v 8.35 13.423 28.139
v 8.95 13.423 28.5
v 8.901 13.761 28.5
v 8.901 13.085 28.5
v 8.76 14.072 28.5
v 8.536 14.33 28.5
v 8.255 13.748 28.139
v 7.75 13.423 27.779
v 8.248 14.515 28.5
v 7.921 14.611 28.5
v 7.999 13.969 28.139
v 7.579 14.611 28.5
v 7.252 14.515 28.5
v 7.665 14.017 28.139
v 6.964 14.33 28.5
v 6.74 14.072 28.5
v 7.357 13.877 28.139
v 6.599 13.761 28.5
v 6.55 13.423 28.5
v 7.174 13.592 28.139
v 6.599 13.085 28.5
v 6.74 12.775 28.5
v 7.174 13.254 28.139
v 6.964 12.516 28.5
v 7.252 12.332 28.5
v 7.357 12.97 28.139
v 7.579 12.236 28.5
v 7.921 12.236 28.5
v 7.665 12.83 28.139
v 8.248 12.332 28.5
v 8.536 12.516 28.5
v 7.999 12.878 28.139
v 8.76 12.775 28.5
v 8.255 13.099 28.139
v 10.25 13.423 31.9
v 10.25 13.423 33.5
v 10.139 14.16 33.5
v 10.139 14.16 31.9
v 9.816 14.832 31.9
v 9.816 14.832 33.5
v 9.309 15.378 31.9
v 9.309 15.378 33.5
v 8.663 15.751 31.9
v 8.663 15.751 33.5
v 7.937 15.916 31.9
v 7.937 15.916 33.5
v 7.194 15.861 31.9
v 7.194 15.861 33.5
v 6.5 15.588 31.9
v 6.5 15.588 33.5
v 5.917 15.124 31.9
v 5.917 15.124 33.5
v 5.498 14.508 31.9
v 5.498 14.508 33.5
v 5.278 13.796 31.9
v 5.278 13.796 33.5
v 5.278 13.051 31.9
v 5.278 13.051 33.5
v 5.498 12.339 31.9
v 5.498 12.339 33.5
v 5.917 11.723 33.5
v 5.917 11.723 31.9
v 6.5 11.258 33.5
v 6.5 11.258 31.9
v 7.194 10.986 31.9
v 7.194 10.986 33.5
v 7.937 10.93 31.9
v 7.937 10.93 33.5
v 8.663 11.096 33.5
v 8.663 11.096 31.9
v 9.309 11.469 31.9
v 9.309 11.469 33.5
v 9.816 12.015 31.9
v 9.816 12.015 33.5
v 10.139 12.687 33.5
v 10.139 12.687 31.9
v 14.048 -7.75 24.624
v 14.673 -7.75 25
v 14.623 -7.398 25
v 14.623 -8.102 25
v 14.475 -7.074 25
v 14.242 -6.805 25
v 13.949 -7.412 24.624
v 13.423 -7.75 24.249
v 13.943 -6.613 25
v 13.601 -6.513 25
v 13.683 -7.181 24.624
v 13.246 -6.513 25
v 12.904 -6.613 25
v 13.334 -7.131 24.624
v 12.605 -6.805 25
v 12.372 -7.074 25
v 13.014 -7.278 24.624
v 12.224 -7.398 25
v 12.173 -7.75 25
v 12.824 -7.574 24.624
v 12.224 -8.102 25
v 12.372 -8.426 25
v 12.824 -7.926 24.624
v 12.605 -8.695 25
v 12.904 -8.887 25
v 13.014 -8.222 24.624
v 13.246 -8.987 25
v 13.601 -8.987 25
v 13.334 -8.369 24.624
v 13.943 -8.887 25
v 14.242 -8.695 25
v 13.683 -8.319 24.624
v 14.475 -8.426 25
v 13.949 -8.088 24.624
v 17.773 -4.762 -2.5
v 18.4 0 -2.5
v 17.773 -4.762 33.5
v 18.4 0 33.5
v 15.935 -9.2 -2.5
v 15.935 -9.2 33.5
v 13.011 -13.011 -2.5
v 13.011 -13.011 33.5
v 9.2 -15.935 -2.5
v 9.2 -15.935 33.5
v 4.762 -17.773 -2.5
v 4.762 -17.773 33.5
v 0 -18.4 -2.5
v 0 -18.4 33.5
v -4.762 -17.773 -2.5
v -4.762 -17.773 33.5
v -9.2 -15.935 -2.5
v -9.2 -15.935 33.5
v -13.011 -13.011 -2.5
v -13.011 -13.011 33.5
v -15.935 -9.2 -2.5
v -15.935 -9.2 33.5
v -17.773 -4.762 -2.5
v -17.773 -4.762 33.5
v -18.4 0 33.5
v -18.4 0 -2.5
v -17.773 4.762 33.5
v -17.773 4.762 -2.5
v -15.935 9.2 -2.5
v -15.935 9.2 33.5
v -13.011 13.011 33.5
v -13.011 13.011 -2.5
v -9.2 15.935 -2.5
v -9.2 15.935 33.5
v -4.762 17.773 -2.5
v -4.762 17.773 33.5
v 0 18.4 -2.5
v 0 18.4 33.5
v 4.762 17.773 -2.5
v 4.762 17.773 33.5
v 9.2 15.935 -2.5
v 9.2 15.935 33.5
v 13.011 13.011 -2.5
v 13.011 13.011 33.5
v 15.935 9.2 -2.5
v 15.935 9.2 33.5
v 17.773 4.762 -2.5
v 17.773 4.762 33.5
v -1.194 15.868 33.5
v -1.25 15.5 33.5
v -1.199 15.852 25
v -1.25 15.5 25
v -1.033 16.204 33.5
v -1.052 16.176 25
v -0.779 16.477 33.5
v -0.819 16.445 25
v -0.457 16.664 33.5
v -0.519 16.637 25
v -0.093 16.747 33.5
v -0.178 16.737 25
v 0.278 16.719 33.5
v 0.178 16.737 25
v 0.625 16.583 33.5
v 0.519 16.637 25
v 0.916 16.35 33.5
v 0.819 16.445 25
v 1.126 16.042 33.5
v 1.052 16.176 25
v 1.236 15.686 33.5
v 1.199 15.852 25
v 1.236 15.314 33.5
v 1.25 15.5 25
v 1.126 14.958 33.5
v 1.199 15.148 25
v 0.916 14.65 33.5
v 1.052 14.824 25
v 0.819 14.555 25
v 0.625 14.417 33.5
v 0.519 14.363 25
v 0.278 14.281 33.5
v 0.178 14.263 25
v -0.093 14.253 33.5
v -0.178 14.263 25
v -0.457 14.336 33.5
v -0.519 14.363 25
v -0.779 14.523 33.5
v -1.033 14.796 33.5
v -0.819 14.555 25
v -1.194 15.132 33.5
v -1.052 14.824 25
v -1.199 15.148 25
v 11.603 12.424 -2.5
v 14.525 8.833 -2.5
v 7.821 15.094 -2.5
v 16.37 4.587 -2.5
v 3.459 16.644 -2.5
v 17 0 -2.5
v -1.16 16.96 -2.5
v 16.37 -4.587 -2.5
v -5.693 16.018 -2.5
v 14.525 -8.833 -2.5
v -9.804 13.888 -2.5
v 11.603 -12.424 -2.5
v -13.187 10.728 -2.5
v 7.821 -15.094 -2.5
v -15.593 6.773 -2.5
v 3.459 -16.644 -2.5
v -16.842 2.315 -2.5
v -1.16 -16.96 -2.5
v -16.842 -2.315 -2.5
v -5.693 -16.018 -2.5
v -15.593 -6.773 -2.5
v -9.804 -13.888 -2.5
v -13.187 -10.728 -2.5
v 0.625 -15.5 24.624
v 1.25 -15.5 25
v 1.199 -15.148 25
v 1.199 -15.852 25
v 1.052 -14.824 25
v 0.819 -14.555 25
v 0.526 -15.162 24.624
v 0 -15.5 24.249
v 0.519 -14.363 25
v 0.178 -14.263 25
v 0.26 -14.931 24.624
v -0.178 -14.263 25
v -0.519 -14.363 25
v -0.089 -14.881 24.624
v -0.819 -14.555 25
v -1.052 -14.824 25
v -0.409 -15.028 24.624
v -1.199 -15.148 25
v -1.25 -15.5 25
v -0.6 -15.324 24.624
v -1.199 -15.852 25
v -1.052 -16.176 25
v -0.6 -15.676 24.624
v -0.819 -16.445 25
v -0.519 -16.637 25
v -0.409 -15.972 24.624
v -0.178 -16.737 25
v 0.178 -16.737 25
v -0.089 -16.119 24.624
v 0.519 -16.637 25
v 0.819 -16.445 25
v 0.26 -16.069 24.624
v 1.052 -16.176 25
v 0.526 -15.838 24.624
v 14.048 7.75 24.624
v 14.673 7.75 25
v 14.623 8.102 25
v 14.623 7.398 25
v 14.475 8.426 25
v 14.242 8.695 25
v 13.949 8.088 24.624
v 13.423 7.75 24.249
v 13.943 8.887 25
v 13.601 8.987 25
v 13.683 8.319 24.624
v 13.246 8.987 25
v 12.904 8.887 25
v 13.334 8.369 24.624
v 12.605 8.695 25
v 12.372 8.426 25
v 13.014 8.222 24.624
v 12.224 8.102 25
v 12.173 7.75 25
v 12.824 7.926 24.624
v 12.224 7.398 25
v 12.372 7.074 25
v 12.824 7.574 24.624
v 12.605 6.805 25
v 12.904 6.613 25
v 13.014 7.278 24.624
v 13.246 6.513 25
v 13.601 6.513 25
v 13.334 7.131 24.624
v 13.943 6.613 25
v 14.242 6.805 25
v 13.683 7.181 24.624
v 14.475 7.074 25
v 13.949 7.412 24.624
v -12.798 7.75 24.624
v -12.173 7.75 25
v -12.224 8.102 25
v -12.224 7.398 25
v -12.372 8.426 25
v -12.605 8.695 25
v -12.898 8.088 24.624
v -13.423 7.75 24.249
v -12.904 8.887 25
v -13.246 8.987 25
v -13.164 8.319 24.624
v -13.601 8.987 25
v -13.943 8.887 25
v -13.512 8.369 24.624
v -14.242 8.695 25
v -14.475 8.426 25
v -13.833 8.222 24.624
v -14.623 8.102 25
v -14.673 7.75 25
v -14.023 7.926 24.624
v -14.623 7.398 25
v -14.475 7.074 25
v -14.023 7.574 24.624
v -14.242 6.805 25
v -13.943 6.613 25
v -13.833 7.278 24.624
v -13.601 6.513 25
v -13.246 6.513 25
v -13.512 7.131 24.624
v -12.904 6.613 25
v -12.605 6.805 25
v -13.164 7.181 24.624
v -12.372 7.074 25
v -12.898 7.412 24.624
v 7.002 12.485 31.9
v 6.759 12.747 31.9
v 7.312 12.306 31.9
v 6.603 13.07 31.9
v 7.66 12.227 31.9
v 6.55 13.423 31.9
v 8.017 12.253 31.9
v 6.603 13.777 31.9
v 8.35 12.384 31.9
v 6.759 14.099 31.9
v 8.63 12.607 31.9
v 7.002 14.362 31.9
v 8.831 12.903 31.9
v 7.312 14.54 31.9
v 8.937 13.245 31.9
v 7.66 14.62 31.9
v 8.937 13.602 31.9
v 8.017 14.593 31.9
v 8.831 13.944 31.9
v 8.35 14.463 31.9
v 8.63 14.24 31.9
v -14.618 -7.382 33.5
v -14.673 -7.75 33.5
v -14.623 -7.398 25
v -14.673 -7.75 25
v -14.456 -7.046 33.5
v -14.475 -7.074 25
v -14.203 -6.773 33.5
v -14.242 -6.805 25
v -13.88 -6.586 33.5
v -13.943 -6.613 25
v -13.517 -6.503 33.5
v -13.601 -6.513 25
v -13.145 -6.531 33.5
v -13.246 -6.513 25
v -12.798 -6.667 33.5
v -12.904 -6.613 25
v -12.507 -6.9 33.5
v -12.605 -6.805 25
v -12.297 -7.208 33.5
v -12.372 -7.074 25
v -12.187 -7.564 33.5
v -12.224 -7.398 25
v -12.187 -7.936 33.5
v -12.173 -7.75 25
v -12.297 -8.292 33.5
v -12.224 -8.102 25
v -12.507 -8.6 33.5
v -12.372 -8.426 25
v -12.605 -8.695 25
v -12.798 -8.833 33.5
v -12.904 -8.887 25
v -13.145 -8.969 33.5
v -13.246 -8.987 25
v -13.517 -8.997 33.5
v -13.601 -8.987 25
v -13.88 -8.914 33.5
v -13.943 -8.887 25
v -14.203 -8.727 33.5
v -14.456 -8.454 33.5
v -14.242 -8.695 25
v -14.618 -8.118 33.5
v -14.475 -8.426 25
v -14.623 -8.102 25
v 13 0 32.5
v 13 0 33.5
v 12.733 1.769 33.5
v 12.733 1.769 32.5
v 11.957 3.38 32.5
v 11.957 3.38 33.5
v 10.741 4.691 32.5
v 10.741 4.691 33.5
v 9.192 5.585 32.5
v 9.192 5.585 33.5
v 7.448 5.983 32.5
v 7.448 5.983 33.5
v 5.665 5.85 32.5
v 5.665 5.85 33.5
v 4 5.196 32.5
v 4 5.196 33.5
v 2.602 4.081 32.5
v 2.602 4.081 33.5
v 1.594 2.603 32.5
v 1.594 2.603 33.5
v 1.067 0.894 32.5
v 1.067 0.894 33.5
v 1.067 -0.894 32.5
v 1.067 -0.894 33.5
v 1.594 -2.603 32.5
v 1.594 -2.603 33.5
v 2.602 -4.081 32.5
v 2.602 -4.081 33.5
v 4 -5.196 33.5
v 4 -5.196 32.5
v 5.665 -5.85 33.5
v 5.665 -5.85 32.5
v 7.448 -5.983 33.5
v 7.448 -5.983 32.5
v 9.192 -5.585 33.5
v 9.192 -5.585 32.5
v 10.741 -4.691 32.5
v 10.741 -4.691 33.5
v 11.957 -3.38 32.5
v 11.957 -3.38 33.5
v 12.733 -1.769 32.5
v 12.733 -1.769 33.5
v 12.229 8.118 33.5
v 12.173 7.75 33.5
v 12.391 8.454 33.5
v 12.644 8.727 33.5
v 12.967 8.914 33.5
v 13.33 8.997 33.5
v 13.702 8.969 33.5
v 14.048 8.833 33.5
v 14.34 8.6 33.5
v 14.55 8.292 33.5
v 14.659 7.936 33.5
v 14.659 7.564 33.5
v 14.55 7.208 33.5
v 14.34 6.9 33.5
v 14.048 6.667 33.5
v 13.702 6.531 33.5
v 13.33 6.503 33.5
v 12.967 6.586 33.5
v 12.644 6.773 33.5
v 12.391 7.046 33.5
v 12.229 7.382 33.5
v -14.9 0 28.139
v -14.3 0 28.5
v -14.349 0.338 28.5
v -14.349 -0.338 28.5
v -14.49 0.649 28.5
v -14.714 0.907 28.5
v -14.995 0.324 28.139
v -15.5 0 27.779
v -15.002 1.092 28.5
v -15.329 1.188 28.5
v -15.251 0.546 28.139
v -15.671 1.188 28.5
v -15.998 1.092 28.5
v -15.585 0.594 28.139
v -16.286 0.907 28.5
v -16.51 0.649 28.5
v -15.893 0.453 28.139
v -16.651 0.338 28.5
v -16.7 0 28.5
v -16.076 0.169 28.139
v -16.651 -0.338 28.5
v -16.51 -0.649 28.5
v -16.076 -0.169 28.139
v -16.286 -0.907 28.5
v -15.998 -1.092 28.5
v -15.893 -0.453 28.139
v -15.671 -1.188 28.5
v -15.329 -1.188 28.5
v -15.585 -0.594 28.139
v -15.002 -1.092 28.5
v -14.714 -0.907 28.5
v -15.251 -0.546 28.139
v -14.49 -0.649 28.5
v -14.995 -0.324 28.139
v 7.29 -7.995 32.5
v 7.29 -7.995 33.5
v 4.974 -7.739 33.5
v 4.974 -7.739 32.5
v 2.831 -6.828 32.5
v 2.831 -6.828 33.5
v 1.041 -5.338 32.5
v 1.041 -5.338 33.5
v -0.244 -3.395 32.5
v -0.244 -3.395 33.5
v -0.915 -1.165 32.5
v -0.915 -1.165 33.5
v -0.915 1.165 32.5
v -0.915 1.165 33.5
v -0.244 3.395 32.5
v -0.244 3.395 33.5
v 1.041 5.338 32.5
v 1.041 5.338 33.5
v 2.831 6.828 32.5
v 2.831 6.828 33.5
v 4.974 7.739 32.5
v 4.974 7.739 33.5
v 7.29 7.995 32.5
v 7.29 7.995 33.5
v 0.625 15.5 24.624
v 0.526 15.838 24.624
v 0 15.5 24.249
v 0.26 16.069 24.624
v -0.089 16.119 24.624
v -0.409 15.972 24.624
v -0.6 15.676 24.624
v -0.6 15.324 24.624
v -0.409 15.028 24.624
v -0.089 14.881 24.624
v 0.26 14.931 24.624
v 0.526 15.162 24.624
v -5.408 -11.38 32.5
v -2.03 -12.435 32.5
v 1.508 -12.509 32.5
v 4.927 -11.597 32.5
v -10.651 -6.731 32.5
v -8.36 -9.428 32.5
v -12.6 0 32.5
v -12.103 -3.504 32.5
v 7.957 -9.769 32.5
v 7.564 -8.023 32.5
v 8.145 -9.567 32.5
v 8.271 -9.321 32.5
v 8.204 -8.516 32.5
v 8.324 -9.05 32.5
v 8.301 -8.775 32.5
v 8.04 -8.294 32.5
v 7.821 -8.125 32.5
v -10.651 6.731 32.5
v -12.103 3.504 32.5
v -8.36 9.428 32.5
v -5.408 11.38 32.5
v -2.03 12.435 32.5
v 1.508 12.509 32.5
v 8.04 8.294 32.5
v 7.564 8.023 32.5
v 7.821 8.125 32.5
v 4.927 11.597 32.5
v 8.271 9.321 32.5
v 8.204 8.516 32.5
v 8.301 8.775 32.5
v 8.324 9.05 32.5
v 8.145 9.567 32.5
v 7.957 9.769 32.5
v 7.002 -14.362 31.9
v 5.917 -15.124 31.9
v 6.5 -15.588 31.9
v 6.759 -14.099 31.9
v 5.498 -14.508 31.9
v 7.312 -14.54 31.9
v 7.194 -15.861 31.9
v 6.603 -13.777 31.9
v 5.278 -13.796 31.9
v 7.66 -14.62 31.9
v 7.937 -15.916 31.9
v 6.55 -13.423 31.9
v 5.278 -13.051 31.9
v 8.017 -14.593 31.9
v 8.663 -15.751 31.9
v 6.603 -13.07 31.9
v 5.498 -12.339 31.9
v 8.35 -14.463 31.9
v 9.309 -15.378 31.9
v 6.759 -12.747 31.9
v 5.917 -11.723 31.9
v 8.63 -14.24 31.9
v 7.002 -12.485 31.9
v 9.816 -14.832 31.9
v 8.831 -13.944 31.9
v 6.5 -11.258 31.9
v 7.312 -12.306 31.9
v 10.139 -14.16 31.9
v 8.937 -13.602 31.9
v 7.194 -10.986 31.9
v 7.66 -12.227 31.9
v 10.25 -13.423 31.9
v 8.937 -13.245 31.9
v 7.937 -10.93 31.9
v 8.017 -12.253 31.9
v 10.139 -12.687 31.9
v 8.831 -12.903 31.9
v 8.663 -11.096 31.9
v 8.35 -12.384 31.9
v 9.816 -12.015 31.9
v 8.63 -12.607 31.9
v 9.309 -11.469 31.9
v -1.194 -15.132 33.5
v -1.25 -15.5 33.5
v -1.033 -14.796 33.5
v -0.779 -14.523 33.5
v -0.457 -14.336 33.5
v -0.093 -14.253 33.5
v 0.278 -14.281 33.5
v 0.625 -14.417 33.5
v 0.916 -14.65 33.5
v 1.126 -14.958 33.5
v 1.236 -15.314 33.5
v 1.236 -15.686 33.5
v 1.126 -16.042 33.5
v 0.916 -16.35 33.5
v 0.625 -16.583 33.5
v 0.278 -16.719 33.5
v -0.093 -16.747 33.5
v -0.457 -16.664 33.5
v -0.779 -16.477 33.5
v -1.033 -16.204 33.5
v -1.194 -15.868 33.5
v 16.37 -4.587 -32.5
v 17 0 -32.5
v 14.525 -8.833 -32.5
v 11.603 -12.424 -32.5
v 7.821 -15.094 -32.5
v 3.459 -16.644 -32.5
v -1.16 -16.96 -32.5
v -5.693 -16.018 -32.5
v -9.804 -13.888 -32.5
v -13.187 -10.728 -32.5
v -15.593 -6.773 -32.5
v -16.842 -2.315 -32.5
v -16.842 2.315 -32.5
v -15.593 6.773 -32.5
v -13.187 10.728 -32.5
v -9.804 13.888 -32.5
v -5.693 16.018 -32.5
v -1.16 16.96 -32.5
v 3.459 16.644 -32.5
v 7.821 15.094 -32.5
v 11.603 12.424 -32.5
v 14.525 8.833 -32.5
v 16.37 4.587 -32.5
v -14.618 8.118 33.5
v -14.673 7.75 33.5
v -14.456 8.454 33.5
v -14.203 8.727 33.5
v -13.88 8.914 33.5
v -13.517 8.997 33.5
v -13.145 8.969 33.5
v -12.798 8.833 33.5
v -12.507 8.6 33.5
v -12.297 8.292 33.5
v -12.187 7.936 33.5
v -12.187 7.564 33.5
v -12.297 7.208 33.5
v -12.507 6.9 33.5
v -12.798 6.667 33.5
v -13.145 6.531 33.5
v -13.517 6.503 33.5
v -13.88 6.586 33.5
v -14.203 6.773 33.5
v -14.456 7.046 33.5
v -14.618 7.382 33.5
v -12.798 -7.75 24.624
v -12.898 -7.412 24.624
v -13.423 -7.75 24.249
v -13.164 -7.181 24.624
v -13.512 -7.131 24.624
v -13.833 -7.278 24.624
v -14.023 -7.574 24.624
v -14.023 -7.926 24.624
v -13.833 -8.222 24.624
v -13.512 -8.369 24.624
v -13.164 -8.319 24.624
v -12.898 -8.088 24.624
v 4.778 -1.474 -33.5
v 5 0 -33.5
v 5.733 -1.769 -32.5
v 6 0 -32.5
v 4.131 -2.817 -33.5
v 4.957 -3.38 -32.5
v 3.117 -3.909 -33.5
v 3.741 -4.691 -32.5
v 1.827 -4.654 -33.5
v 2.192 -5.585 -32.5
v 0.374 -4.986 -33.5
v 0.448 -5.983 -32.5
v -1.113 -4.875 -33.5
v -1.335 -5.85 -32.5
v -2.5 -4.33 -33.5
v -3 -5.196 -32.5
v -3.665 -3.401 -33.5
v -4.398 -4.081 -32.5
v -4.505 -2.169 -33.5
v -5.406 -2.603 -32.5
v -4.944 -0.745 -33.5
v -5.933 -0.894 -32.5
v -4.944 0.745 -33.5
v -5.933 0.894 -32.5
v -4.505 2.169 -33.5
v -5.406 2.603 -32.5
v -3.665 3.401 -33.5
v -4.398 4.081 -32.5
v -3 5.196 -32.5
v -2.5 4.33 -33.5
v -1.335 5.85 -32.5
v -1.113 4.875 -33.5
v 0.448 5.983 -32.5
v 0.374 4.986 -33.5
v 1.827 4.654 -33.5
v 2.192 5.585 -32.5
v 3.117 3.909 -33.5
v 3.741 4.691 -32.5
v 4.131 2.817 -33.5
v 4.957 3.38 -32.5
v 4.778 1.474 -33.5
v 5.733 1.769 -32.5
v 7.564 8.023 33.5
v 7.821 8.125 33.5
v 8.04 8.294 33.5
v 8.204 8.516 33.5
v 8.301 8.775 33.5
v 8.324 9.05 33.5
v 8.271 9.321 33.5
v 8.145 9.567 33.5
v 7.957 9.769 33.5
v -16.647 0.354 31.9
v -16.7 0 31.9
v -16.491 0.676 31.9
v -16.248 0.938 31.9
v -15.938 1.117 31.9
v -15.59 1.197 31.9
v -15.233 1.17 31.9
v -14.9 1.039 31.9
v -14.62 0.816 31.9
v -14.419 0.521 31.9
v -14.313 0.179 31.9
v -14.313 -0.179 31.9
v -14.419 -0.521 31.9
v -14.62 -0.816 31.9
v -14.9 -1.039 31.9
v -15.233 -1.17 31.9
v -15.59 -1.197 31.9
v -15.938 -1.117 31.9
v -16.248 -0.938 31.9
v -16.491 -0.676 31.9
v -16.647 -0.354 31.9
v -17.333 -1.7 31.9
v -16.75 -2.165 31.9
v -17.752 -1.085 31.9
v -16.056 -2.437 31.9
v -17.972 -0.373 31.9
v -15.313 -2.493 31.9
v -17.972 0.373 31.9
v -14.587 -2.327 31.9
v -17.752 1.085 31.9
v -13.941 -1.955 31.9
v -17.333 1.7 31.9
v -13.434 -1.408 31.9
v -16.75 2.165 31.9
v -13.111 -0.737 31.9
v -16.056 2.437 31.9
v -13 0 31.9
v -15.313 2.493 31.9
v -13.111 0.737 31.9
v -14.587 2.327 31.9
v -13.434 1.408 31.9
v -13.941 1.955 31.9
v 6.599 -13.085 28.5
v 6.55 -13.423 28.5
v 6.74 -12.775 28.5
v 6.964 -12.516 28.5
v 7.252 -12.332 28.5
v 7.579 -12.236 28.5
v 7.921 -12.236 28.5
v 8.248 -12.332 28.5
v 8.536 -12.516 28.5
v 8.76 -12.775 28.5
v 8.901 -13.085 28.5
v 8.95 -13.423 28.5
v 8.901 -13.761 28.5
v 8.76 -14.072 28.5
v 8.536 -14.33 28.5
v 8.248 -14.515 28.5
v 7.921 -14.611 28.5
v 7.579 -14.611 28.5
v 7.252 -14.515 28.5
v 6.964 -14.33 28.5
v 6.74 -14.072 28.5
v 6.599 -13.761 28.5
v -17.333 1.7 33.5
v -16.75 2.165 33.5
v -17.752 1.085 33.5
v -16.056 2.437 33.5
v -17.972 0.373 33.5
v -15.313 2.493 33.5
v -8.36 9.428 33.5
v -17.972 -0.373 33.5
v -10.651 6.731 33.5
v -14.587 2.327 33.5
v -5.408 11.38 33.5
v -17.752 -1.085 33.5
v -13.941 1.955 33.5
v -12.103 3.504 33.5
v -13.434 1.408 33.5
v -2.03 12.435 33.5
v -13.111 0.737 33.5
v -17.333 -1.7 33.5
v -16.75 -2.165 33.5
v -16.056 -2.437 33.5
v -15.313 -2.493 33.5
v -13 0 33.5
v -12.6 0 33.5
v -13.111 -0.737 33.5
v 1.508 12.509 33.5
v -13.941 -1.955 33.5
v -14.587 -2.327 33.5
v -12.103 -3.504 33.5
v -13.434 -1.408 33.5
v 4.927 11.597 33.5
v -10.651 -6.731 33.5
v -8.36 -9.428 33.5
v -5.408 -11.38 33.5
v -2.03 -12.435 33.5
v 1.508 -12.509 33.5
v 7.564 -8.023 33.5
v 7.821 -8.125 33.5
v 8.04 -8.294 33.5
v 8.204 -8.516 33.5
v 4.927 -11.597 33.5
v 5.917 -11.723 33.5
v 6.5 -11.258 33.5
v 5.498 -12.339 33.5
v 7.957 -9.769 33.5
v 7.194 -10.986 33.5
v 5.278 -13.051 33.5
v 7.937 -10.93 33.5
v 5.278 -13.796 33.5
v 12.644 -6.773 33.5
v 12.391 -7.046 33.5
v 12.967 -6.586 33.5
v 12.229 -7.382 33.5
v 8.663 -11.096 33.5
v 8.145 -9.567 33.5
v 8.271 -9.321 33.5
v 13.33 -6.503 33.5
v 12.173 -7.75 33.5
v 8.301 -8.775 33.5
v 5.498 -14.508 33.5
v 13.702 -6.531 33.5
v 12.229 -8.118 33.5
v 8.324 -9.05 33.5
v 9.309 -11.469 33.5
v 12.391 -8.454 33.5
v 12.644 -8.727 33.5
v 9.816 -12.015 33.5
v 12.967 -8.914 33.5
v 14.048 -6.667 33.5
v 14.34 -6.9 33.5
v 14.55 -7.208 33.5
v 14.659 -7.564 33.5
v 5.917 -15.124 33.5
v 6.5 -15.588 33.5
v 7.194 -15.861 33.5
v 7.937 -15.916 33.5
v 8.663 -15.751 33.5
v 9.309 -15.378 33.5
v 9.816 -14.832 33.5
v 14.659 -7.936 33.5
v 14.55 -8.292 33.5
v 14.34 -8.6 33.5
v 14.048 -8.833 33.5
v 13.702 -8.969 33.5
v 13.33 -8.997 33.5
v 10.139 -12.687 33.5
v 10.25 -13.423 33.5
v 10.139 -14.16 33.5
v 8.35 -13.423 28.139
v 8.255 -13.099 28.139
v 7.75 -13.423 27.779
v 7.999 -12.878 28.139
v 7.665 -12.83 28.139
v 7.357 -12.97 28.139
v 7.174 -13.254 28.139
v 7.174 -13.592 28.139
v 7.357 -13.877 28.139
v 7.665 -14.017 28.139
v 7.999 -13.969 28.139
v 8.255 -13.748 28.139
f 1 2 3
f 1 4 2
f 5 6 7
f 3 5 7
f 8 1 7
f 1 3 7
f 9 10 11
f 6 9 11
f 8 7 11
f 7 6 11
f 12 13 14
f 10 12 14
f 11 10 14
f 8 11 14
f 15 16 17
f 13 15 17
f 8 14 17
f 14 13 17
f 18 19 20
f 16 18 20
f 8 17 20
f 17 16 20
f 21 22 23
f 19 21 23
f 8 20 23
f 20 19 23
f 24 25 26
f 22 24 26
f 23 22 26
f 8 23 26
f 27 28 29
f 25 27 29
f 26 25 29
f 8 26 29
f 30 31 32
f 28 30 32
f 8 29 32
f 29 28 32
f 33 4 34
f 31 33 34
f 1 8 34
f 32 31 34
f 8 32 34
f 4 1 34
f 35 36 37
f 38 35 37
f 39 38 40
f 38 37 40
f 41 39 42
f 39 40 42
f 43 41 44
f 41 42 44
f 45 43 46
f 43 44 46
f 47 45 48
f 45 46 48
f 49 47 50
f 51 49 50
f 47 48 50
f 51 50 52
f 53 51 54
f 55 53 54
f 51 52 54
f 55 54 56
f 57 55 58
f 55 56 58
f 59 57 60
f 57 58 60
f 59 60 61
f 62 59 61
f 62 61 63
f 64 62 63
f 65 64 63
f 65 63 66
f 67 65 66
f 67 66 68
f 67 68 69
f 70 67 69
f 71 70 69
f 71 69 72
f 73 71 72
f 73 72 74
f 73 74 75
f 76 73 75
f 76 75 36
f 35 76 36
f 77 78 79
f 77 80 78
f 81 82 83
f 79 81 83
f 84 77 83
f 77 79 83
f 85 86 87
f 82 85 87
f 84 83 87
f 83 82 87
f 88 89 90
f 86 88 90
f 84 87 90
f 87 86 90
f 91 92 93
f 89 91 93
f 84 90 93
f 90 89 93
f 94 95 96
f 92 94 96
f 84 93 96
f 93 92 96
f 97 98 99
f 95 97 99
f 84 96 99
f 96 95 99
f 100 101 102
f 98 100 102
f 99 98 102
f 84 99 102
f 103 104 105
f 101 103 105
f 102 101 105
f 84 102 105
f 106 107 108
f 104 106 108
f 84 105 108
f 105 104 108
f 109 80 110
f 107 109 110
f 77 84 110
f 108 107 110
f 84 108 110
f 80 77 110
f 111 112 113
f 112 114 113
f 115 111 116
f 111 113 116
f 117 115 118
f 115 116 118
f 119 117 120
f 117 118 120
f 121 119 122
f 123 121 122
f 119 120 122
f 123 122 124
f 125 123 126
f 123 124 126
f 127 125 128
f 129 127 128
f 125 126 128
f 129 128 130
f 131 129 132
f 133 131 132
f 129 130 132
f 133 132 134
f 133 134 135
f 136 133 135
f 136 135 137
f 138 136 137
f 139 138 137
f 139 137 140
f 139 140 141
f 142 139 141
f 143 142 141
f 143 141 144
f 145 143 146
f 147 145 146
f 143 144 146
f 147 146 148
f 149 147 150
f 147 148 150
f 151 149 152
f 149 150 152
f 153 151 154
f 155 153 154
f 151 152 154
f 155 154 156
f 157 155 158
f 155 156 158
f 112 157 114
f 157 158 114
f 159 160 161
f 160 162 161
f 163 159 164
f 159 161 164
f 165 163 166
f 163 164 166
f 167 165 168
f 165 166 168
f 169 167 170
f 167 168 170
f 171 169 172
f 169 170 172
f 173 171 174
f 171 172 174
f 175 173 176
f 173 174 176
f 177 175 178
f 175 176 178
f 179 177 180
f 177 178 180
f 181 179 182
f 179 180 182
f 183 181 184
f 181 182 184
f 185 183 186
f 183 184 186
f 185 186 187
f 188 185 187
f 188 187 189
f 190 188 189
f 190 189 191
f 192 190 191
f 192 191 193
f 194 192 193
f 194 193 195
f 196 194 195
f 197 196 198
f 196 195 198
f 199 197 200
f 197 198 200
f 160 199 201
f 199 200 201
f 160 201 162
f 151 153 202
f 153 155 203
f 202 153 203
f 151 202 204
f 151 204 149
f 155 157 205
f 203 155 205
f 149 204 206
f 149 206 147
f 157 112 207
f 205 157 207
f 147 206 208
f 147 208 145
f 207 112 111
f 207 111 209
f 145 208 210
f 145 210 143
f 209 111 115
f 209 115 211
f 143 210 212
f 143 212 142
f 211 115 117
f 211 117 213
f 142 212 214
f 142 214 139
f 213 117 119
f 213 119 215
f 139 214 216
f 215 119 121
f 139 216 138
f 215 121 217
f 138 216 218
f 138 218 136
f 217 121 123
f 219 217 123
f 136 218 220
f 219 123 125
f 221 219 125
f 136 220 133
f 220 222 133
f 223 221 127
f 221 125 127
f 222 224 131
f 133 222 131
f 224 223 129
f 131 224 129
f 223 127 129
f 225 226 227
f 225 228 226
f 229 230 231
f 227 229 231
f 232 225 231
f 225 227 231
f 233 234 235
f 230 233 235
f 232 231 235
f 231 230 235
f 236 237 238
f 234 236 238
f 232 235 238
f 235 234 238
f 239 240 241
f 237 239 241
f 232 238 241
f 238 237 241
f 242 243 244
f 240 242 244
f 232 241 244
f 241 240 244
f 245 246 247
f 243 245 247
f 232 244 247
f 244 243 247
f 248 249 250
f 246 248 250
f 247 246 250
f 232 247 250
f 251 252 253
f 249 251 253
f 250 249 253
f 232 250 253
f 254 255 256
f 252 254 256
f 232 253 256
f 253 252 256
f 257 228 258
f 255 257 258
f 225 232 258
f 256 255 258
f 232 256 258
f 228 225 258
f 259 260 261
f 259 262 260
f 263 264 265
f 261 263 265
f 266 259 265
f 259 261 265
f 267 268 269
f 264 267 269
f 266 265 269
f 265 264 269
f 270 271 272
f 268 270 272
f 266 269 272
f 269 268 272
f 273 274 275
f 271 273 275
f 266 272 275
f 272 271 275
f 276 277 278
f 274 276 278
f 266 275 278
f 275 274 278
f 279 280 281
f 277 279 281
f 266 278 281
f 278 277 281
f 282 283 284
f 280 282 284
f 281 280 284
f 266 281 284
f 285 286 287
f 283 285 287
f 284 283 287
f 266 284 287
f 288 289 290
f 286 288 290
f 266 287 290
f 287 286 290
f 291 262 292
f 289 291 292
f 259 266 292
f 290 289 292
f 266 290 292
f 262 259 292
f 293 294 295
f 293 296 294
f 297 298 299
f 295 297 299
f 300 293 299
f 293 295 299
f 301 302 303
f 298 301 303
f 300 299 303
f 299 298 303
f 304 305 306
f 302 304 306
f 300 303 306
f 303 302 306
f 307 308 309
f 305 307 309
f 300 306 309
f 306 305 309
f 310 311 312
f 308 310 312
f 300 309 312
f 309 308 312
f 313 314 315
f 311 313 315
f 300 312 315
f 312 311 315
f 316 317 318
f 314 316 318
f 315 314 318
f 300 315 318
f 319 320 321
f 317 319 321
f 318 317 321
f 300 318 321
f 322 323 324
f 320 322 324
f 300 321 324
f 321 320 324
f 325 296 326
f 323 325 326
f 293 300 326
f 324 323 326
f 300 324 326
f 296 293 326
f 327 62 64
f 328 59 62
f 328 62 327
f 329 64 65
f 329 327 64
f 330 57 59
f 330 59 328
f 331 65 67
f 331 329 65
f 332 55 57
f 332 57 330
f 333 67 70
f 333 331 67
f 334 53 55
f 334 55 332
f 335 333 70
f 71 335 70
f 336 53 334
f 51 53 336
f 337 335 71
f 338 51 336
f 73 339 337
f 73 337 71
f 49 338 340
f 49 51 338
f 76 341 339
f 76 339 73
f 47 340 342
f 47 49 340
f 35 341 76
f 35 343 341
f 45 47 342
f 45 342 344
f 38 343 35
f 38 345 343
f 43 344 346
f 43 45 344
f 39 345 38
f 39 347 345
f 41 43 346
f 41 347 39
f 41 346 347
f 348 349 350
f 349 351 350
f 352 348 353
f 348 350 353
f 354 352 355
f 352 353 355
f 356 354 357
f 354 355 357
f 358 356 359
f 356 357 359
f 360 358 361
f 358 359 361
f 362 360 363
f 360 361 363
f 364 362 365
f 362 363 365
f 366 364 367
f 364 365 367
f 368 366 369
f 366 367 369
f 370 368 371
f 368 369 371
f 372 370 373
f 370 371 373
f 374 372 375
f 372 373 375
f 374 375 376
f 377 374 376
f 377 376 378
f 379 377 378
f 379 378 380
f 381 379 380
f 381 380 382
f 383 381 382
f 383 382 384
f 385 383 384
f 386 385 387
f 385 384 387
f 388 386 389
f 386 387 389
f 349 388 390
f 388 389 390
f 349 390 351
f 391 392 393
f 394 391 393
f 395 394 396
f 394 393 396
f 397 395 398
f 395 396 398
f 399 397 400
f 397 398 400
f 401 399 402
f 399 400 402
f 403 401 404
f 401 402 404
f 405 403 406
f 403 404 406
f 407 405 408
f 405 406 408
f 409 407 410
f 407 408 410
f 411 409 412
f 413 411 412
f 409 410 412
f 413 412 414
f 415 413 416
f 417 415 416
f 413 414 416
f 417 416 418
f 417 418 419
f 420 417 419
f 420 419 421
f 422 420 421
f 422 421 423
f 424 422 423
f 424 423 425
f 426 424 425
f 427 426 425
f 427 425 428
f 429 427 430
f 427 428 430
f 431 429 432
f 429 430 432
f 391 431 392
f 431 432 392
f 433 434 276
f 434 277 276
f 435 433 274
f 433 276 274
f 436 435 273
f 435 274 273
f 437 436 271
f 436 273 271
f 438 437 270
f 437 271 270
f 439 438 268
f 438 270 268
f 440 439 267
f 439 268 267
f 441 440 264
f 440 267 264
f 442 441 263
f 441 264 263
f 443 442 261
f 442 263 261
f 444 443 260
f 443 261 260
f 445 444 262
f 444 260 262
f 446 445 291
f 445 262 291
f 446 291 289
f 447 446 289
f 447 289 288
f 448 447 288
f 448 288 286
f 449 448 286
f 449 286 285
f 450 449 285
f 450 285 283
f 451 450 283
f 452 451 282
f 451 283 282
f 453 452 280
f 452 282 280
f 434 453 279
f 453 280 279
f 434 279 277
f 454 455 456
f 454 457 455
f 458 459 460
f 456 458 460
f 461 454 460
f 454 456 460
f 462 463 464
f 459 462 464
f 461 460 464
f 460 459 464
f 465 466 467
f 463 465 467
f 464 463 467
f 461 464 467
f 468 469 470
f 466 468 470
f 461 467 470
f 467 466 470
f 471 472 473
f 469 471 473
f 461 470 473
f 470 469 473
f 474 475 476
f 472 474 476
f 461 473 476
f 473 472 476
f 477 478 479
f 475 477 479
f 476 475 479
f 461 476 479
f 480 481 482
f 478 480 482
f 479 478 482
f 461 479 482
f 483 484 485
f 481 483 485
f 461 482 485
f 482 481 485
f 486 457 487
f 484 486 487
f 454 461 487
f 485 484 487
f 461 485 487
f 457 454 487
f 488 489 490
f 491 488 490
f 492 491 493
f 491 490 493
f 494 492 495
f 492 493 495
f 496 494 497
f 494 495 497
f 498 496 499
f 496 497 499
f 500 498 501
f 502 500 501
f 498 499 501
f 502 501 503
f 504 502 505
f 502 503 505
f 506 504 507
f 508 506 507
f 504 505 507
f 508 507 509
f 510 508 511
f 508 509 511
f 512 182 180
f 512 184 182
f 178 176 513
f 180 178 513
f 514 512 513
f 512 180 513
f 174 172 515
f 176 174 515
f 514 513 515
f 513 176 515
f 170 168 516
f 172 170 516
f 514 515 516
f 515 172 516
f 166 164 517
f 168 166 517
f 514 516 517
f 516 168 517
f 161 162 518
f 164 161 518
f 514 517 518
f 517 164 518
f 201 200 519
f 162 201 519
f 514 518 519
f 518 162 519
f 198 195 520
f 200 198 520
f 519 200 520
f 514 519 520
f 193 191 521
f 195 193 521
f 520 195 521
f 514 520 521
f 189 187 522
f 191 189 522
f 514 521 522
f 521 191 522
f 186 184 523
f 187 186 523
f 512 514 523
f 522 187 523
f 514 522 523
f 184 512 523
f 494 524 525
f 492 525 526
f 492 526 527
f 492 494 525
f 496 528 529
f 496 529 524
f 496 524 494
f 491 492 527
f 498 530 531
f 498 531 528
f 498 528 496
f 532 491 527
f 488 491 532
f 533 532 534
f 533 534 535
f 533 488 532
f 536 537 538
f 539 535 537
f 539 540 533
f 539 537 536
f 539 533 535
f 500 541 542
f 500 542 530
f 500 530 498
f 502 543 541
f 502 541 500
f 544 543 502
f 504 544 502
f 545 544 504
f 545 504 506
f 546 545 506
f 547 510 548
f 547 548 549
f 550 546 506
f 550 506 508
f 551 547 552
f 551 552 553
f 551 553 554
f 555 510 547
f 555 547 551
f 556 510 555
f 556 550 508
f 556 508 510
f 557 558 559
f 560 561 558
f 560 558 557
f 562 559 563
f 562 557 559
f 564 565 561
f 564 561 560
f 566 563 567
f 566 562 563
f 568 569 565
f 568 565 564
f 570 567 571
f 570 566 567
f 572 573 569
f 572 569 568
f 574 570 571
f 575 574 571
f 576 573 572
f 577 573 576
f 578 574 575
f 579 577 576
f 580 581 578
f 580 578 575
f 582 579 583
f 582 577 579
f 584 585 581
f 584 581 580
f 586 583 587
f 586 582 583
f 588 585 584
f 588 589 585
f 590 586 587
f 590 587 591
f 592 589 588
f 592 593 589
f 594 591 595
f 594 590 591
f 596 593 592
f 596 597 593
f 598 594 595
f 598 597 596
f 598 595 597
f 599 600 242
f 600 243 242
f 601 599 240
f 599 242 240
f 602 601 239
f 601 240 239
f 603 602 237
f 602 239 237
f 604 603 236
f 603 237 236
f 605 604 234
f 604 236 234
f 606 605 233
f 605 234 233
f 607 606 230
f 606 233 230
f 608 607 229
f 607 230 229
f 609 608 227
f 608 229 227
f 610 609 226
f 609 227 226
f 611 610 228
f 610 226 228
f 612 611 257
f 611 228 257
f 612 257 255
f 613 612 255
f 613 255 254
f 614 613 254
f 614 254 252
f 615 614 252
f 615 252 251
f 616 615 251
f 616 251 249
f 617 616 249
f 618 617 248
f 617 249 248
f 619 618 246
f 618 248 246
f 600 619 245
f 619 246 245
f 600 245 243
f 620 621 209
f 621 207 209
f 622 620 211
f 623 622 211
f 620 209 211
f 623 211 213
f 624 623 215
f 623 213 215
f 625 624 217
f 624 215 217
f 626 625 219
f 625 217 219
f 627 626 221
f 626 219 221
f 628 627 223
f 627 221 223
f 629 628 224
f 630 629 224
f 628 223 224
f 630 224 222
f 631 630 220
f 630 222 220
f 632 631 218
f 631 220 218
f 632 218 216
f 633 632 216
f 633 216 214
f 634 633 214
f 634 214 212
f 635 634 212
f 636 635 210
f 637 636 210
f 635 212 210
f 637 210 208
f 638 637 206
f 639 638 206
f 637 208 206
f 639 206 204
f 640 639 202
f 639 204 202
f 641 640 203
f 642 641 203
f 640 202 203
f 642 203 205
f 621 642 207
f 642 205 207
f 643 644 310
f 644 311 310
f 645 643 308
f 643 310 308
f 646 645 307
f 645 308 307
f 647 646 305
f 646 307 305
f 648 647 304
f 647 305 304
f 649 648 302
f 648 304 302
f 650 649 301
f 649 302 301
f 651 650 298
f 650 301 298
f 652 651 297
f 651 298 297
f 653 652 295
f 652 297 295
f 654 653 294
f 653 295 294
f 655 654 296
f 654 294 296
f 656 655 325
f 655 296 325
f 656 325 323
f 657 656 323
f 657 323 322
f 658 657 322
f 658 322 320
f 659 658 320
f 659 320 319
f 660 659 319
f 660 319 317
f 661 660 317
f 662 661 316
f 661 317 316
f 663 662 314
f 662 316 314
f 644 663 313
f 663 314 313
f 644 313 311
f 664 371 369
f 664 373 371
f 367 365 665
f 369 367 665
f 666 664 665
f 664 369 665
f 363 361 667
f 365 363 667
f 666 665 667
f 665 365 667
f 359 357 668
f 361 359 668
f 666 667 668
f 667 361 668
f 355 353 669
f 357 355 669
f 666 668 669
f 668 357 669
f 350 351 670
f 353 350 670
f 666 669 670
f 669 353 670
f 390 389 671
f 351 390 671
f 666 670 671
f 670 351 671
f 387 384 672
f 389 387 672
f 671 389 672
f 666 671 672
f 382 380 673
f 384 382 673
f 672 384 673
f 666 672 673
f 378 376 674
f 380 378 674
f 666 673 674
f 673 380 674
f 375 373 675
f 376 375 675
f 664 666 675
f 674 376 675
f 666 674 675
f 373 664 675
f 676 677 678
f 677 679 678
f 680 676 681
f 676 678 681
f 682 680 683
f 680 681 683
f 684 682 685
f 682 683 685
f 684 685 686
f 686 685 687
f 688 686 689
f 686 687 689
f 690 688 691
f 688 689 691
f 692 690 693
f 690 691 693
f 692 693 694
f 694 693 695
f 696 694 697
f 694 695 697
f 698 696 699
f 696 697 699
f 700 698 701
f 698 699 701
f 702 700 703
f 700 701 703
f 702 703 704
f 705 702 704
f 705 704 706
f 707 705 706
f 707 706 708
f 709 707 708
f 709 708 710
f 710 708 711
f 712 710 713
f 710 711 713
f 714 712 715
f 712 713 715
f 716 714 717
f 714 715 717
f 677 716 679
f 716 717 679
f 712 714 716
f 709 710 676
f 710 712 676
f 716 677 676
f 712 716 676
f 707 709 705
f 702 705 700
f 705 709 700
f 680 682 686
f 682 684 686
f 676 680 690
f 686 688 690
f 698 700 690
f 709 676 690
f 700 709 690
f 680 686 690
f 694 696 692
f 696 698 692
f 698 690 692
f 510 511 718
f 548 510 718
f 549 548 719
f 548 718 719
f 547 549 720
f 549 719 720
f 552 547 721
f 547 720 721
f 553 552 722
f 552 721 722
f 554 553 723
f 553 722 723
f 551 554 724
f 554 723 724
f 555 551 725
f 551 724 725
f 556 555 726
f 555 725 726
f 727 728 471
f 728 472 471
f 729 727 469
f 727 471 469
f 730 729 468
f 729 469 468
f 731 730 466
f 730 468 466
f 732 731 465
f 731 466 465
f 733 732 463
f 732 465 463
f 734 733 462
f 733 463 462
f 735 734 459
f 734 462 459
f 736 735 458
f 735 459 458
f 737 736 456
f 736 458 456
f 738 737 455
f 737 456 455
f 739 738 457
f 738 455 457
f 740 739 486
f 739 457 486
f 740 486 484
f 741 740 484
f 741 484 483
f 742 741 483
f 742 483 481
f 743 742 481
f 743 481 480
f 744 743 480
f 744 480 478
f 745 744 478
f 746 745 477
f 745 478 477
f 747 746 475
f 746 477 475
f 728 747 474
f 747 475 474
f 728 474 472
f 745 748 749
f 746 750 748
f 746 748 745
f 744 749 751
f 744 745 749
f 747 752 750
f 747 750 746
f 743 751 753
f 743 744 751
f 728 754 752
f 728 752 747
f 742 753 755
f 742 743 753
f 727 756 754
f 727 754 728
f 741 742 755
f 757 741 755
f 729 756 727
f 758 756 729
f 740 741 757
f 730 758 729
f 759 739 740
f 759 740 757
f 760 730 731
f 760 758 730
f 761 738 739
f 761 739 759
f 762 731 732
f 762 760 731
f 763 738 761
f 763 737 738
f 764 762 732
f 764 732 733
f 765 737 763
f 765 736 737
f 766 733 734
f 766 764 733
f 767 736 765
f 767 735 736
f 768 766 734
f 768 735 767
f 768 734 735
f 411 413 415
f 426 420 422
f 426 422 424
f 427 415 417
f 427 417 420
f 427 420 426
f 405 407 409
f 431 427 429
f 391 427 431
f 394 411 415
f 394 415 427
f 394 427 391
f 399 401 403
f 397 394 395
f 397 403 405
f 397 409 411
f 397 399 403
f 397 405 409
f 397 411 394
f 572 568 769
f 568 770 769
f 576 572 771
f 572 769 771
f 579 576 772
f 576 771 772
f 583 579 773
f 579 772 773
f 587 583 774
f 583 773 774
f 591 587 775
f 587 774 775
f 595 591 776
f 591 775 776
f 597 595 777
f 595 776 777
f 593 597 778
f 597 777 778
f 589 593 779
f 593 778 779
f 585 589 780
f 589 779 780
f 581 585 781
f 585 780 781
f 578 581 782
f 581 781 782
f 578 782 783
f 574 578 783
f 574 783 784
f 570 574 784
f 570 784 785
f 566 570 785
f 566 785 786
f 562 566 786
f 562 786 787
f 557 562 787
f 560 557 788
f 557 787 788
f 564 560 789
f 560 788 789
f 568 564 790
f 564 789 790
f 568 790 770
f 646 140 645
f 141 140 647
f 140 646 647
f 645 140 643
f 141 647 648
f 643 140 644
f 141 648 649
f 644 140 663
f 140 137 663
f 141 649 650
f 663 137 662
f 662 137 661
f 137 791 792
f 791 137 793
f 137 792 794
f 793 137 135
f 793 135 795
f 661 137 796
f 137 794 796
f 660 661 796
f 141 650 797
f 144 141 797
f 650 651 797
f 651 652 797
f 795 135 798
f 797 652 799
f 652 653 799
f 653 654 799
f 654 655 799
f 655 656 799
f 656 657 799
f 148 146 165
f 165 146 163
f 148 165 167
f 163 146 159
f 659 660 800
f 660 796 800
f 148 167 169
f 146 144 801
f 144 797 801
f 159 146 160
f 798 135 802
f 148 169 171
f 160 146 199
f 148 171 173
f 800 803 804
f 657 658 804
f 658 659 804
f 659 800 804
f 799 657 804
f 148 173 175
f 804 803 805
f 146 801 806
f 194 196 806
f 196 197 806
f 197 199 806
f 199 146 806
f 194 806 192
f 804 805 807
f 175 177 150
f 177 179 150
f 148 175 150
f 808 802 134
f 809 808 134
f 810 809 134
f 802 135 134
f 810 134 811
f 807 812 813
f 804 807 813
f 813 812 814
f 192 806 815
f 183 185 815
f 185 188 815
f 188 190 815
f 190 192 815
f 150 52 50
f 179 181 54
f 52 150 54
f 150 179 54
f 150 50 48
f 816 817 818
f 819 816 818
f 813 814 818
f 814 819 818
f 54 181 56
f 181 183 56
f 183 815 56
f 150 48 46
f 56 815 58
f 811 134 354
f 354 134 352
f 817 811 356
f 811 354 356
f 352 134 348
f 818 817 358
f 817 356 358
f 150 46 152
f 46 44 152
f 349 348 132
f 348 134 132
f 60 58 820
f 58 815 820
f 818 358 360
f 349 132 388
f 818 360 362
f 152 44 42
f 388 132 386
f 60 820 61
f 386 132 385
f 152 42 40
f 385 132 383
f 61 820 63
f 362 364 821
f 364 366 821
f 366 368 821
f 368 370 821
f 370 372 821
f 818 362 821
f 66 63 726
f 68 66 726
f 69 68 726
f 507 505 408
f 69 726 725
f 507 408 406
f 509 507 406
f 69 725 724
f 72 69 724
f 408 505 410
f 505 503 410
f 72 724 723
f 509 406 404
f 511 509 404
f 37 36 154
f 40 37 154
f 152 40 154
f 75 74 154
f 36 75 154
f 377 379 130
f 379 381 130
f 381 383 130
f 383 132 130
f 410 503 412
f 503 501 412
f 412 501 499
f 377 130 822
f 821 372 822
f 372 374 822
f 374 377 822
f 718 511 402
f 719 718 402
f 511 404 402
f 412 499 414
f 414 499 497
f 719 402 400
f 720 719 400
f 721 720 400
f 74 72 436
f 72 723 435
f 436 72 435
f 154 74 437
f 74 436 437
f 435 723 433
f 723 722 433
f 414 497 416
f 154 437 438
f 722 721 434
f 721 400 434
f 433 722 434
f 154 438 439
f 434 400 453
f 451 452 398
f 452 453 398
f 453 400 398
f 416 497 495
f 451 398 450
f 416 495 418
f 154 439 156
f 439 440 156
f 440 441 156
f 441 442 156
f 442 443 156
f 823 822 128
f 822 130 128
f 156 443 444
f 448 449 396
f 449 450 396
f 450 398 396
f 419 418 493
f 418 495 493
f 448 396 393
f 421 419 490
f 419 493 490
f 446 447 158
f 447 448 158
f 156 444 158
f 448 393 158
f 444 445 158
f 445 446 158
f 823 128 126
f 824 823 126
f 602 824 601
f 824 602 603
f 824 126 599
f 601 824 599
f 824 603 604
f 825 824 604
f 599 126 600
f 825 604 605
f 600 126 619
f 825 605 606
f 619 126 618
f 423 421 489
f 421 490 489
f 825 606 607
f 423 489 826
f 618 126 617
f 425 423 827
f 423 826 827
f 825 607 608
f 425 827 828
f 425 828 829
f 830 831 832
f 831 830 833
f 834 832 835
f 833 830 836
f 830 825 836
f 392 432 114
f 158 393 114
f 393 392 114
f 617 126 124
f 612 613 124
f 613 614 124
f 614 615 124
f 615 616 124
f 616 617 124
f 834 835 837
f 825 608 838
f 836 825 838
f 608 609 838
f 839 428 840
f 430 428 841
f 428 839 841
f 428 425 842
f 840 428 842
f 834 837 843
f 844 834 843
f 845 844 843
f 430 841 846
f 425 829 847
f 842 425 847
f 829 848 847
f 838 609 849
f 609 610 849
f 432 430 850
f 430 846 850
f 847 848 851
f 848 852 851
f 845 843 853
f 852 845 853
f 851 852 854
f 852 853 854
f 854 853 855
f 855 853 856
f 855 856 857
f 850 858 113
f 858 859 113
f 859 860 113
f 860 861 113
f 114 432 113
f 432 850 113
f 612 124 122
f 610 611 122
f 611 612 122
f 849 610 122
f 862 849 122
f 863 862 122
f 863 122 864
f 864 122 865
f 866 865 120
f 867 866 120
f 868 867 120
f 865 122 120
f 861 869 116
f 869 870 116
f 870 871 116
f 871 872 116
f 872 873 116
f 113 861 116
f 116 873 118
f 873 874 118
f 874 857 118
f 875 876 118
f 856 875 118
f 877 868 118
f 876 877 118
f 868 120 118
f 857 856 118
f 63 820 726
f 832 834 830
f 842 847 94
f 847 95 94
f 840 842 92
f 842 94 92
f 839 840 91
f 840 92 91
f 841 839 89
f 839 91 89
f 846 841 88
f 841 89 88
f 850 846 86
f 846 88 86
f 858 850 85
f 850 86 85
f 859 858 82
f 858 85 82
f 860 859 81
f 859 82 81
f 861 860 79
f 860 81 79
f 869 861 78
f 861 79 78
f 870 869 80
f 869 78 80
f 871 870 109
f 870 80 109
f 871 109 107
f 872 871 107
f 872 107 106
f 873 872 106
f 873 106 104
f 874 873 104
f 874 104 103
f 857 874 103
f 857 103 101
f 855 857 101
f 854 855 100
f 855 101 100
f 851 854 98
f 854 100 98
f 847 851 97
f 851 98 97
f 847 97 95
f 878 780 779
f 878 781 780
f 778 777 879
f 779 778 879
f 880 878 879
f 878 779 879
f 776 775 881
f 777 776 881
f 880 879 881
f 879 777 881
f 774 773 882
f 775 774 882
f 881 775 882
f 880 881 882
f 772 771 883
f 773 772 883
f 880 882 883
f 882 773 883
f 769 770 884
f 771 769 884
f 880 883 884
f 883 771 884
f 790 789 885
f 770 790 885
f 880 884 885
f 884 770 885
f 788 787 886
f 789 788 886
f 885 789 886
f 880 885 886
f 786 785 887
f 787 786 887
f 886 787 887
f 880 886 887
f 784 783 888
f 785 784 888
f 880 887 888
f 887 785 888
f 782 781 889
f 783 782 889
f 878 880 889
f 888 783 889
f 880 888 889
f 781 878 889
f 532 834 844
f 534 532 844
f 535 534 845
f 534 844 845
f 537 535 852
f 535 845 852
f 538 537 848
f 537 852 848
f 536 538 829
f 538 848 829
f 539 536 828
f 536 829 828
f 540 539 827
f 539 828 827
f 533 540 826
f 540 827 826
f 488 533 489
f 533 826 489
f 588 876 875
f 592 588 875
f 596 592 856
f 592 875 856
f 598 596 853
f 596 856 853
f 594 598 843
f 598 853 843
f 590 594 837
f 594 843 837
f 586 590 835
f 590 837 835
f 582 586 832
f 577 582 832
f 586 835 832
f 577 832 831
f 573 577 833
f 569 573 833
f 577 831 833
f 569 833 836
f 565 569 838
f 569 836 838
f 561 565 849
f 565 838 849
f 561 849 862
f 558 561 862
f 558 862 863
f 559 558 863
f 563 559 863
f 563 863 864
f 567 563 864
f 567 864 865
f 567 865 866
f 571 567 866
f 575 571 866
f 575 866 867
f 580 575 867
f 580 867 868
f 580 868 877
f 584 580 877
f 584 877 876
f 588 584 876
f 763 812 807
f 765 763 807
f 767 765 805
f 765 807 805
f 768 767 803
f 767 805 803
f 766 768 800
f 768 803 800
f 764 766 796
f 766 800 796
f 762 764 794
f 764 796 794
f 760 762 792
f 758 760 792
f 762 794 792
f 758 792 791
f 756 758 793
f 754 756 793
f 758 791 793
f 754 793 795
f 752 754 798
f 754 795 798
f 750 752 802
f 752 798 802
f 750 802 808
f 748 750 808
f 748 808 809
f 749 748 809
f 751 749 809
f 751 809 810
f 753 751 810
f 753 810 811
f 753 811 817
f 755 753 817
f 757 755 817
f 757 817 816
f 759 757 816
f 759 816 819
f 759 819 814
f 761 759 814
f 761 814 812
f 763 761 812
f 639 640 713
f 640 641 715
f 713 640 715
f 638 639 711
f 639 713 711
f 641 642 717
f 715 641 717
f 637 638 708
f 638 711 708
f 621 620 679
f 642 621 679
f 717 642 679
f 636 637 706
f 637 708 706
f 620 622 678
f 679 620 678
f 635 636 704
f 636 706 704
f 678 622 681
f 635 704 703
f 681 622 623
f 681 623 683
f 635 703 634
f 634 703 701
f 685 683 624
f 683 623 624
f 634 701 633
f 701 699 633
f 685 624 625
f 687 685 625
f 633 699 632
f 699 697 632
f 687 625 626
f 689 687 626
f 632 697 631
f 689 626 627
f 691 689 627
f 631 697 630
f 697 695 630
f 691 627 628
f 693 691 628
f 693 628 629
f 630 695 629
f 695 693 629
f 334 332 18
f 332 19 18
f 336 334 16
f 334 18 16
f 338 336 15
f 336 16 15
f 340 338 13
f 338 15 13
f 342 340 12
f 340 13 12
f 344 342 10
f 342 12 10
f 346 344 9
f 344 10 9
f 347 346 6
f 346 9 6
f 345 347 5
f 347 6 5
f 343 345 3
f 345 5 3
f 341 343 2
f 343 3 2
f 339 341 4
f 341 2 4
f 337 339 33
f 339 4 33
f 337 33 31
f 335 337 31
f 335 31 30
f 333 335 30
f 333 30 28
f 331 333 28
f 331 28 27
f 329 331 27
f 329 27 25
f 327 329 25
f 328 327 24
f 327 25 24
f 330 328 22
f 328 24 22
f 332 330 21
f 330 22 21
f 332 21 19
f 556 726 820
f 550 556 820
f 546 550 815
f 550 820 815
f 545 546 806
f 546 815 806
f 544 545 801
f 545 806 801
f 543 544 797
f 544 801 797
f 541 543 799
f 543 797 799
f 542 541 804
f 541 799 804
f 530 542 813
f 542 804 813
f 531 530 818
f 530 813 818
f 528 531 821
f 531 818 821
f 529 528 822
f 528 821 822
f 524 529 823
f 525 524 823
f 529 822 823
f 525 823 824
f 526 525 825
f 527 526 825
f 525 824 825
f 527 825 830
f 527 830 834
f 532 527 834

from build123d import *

# Parameters (mm, degrees)
TALADRO_ROSCADO_M3X0_52_D                            = 2.5
TALADRO_ROSCADO_M3X0_52_DEPTH                        = 8.5
TALADRO_ROSCADO_M3X0_52_TIP                          = 0.751075774
REFRENTADO_PARA_TORNILLO_CON_CABEZA_TRON_D           = 2.4
REFRENTADO_PARA_TORNILLO_CON_CABEZA_TRON_DEPTH       = 5
REFRENTADO_PARA_TORNILLO_CON_CABEZA_TRON_CBORE_D     = 5
REFRENTADO_PARA_TORNILLO_CON_CABEZA_TRON_CBORE_DEPTH = 1.6
REFRENTADO_PARA_TORNILLO_CON_CABEZA_TRON_TIP         = 0.721032743
CROQUIS8_R                                           = 6
CORTAR_EXTRUIR2_DEPTH                                = 1


with BuildPart() as part:
    # Croquis1 → Revolución1 (revolve)
    with BuildSketch(Plane(origin=(0, 0, 0), x_dir=(0, 0, -1), z_dir=(1, 0, 0)), mode=Mode.PRIVATE) as revoluci_n1_sk:
        Polygon((-33.5, 0), (33.5, 0), (33.5, 5), (32.5, 6), (32.5, 17), (2.5, 17), (2.5, 18.4), (-33.5, 18.4), align=None)
    revolve(revoluci_n1_sk.sketch.rotate(Axis((0, 0, 33.5), (0, 0, -1)), 90), axis=Axis((0, 0, 33.5), (0, 0, -1)))

    # Taladro roscado M3x0.52
    with Locations(Plane.XY.offset(33.5)):
        with Locations((0, 15.5), (0, -15.5), (13.423393759, -7.75), (13.423393759, 7.75), (-13.423393759, 7.75), (-13.423393759, -7.75)):
            Hole(TALADRO_ROSCADO_M3X0_52_D / 2, depth=TALADRO_ROSCADO_M3X0_52_DEPTH)
            with Locations((0, 0, -(TALADRO_ROSCADO_M3X0_52_DEPTH + TALADRO_ROSCADO_M3X0_52_TIP / 2))):  # 118° drill point
                Cone(0, TALADRO_ROSCADO_M3X0_52_D / 2, TALADRO_ROSCADO_M3X0_52_TIP, mode=Mode.SUBTRACT)

    # Refrentado para tornillo con cabeza troncocónica de M21
    with Locations(Plane.XY.offset(33.5)):
        with Locations((-15.5, 0), (7.75, 13.423393759), (7.75, -13.423393759)):
            CounterBoreHole(REFRENTADO_PARA_TORNILLO_CON_CABEZA_TRON_D / 2, REFRENTADO_PARA_TORNILLO_CON_CABEZA_TRON_CBORE_D / 2, REFRENTADO_PARA_TORNILLO_CON_CABEZA_TRON_CBORE_DEPTH, depth=REFRENTADO_PARA_TORNILLO_CON_CABEZA_TRON_DEPTH)
            with Locations((0, 0, -(REFRENTADO_PARA_TORNILLO_CON_CABEZA_TRON_DEPTH + REFRENTADO_PARA_TORNILLO_CON_CABEZA_TRON_TIP / 2))):  # 118° drill point
                Cone(0, REFRENTADO_PARA_TORNILLO_CON_CABEZA_TRON_D / 2, REFRENTADO_PARA_TORNILLO_CON_CABEZA_TRON_TIP, mode=Mode.SUBTRACT)

    # Croquis8 → Cortar-Extruir2 (cut)
    with BuildSketch(Plane.XY.offset(33.5)):
        with Locations((7, 0)):
            Circle(CROQUIS8_R)
        with BuildLine():
            ThreePointArc((7.957241379, 9.769458001), (-12.6, 0), (7.957241379, -9.769458001))
            ThreePointArc((7.957241379, -9.769458001), (8.261660496, -8.641961193), (7.28952381, -7.994759281))
            ThreePointArc((7.28952381, -7.994759281), (-1, 0), (7.28952381, 7.994759281))
            ThreePointArc((7.28952381, 7.994759281), (8.261660496, 8.641961193), (7.957241379, 9.769458001))
        make_face()
    extrude(amount=-CORTAR_EXTRUIR2_DEPTH, mode=Mode.SUBTRACT)


solid = part.part
